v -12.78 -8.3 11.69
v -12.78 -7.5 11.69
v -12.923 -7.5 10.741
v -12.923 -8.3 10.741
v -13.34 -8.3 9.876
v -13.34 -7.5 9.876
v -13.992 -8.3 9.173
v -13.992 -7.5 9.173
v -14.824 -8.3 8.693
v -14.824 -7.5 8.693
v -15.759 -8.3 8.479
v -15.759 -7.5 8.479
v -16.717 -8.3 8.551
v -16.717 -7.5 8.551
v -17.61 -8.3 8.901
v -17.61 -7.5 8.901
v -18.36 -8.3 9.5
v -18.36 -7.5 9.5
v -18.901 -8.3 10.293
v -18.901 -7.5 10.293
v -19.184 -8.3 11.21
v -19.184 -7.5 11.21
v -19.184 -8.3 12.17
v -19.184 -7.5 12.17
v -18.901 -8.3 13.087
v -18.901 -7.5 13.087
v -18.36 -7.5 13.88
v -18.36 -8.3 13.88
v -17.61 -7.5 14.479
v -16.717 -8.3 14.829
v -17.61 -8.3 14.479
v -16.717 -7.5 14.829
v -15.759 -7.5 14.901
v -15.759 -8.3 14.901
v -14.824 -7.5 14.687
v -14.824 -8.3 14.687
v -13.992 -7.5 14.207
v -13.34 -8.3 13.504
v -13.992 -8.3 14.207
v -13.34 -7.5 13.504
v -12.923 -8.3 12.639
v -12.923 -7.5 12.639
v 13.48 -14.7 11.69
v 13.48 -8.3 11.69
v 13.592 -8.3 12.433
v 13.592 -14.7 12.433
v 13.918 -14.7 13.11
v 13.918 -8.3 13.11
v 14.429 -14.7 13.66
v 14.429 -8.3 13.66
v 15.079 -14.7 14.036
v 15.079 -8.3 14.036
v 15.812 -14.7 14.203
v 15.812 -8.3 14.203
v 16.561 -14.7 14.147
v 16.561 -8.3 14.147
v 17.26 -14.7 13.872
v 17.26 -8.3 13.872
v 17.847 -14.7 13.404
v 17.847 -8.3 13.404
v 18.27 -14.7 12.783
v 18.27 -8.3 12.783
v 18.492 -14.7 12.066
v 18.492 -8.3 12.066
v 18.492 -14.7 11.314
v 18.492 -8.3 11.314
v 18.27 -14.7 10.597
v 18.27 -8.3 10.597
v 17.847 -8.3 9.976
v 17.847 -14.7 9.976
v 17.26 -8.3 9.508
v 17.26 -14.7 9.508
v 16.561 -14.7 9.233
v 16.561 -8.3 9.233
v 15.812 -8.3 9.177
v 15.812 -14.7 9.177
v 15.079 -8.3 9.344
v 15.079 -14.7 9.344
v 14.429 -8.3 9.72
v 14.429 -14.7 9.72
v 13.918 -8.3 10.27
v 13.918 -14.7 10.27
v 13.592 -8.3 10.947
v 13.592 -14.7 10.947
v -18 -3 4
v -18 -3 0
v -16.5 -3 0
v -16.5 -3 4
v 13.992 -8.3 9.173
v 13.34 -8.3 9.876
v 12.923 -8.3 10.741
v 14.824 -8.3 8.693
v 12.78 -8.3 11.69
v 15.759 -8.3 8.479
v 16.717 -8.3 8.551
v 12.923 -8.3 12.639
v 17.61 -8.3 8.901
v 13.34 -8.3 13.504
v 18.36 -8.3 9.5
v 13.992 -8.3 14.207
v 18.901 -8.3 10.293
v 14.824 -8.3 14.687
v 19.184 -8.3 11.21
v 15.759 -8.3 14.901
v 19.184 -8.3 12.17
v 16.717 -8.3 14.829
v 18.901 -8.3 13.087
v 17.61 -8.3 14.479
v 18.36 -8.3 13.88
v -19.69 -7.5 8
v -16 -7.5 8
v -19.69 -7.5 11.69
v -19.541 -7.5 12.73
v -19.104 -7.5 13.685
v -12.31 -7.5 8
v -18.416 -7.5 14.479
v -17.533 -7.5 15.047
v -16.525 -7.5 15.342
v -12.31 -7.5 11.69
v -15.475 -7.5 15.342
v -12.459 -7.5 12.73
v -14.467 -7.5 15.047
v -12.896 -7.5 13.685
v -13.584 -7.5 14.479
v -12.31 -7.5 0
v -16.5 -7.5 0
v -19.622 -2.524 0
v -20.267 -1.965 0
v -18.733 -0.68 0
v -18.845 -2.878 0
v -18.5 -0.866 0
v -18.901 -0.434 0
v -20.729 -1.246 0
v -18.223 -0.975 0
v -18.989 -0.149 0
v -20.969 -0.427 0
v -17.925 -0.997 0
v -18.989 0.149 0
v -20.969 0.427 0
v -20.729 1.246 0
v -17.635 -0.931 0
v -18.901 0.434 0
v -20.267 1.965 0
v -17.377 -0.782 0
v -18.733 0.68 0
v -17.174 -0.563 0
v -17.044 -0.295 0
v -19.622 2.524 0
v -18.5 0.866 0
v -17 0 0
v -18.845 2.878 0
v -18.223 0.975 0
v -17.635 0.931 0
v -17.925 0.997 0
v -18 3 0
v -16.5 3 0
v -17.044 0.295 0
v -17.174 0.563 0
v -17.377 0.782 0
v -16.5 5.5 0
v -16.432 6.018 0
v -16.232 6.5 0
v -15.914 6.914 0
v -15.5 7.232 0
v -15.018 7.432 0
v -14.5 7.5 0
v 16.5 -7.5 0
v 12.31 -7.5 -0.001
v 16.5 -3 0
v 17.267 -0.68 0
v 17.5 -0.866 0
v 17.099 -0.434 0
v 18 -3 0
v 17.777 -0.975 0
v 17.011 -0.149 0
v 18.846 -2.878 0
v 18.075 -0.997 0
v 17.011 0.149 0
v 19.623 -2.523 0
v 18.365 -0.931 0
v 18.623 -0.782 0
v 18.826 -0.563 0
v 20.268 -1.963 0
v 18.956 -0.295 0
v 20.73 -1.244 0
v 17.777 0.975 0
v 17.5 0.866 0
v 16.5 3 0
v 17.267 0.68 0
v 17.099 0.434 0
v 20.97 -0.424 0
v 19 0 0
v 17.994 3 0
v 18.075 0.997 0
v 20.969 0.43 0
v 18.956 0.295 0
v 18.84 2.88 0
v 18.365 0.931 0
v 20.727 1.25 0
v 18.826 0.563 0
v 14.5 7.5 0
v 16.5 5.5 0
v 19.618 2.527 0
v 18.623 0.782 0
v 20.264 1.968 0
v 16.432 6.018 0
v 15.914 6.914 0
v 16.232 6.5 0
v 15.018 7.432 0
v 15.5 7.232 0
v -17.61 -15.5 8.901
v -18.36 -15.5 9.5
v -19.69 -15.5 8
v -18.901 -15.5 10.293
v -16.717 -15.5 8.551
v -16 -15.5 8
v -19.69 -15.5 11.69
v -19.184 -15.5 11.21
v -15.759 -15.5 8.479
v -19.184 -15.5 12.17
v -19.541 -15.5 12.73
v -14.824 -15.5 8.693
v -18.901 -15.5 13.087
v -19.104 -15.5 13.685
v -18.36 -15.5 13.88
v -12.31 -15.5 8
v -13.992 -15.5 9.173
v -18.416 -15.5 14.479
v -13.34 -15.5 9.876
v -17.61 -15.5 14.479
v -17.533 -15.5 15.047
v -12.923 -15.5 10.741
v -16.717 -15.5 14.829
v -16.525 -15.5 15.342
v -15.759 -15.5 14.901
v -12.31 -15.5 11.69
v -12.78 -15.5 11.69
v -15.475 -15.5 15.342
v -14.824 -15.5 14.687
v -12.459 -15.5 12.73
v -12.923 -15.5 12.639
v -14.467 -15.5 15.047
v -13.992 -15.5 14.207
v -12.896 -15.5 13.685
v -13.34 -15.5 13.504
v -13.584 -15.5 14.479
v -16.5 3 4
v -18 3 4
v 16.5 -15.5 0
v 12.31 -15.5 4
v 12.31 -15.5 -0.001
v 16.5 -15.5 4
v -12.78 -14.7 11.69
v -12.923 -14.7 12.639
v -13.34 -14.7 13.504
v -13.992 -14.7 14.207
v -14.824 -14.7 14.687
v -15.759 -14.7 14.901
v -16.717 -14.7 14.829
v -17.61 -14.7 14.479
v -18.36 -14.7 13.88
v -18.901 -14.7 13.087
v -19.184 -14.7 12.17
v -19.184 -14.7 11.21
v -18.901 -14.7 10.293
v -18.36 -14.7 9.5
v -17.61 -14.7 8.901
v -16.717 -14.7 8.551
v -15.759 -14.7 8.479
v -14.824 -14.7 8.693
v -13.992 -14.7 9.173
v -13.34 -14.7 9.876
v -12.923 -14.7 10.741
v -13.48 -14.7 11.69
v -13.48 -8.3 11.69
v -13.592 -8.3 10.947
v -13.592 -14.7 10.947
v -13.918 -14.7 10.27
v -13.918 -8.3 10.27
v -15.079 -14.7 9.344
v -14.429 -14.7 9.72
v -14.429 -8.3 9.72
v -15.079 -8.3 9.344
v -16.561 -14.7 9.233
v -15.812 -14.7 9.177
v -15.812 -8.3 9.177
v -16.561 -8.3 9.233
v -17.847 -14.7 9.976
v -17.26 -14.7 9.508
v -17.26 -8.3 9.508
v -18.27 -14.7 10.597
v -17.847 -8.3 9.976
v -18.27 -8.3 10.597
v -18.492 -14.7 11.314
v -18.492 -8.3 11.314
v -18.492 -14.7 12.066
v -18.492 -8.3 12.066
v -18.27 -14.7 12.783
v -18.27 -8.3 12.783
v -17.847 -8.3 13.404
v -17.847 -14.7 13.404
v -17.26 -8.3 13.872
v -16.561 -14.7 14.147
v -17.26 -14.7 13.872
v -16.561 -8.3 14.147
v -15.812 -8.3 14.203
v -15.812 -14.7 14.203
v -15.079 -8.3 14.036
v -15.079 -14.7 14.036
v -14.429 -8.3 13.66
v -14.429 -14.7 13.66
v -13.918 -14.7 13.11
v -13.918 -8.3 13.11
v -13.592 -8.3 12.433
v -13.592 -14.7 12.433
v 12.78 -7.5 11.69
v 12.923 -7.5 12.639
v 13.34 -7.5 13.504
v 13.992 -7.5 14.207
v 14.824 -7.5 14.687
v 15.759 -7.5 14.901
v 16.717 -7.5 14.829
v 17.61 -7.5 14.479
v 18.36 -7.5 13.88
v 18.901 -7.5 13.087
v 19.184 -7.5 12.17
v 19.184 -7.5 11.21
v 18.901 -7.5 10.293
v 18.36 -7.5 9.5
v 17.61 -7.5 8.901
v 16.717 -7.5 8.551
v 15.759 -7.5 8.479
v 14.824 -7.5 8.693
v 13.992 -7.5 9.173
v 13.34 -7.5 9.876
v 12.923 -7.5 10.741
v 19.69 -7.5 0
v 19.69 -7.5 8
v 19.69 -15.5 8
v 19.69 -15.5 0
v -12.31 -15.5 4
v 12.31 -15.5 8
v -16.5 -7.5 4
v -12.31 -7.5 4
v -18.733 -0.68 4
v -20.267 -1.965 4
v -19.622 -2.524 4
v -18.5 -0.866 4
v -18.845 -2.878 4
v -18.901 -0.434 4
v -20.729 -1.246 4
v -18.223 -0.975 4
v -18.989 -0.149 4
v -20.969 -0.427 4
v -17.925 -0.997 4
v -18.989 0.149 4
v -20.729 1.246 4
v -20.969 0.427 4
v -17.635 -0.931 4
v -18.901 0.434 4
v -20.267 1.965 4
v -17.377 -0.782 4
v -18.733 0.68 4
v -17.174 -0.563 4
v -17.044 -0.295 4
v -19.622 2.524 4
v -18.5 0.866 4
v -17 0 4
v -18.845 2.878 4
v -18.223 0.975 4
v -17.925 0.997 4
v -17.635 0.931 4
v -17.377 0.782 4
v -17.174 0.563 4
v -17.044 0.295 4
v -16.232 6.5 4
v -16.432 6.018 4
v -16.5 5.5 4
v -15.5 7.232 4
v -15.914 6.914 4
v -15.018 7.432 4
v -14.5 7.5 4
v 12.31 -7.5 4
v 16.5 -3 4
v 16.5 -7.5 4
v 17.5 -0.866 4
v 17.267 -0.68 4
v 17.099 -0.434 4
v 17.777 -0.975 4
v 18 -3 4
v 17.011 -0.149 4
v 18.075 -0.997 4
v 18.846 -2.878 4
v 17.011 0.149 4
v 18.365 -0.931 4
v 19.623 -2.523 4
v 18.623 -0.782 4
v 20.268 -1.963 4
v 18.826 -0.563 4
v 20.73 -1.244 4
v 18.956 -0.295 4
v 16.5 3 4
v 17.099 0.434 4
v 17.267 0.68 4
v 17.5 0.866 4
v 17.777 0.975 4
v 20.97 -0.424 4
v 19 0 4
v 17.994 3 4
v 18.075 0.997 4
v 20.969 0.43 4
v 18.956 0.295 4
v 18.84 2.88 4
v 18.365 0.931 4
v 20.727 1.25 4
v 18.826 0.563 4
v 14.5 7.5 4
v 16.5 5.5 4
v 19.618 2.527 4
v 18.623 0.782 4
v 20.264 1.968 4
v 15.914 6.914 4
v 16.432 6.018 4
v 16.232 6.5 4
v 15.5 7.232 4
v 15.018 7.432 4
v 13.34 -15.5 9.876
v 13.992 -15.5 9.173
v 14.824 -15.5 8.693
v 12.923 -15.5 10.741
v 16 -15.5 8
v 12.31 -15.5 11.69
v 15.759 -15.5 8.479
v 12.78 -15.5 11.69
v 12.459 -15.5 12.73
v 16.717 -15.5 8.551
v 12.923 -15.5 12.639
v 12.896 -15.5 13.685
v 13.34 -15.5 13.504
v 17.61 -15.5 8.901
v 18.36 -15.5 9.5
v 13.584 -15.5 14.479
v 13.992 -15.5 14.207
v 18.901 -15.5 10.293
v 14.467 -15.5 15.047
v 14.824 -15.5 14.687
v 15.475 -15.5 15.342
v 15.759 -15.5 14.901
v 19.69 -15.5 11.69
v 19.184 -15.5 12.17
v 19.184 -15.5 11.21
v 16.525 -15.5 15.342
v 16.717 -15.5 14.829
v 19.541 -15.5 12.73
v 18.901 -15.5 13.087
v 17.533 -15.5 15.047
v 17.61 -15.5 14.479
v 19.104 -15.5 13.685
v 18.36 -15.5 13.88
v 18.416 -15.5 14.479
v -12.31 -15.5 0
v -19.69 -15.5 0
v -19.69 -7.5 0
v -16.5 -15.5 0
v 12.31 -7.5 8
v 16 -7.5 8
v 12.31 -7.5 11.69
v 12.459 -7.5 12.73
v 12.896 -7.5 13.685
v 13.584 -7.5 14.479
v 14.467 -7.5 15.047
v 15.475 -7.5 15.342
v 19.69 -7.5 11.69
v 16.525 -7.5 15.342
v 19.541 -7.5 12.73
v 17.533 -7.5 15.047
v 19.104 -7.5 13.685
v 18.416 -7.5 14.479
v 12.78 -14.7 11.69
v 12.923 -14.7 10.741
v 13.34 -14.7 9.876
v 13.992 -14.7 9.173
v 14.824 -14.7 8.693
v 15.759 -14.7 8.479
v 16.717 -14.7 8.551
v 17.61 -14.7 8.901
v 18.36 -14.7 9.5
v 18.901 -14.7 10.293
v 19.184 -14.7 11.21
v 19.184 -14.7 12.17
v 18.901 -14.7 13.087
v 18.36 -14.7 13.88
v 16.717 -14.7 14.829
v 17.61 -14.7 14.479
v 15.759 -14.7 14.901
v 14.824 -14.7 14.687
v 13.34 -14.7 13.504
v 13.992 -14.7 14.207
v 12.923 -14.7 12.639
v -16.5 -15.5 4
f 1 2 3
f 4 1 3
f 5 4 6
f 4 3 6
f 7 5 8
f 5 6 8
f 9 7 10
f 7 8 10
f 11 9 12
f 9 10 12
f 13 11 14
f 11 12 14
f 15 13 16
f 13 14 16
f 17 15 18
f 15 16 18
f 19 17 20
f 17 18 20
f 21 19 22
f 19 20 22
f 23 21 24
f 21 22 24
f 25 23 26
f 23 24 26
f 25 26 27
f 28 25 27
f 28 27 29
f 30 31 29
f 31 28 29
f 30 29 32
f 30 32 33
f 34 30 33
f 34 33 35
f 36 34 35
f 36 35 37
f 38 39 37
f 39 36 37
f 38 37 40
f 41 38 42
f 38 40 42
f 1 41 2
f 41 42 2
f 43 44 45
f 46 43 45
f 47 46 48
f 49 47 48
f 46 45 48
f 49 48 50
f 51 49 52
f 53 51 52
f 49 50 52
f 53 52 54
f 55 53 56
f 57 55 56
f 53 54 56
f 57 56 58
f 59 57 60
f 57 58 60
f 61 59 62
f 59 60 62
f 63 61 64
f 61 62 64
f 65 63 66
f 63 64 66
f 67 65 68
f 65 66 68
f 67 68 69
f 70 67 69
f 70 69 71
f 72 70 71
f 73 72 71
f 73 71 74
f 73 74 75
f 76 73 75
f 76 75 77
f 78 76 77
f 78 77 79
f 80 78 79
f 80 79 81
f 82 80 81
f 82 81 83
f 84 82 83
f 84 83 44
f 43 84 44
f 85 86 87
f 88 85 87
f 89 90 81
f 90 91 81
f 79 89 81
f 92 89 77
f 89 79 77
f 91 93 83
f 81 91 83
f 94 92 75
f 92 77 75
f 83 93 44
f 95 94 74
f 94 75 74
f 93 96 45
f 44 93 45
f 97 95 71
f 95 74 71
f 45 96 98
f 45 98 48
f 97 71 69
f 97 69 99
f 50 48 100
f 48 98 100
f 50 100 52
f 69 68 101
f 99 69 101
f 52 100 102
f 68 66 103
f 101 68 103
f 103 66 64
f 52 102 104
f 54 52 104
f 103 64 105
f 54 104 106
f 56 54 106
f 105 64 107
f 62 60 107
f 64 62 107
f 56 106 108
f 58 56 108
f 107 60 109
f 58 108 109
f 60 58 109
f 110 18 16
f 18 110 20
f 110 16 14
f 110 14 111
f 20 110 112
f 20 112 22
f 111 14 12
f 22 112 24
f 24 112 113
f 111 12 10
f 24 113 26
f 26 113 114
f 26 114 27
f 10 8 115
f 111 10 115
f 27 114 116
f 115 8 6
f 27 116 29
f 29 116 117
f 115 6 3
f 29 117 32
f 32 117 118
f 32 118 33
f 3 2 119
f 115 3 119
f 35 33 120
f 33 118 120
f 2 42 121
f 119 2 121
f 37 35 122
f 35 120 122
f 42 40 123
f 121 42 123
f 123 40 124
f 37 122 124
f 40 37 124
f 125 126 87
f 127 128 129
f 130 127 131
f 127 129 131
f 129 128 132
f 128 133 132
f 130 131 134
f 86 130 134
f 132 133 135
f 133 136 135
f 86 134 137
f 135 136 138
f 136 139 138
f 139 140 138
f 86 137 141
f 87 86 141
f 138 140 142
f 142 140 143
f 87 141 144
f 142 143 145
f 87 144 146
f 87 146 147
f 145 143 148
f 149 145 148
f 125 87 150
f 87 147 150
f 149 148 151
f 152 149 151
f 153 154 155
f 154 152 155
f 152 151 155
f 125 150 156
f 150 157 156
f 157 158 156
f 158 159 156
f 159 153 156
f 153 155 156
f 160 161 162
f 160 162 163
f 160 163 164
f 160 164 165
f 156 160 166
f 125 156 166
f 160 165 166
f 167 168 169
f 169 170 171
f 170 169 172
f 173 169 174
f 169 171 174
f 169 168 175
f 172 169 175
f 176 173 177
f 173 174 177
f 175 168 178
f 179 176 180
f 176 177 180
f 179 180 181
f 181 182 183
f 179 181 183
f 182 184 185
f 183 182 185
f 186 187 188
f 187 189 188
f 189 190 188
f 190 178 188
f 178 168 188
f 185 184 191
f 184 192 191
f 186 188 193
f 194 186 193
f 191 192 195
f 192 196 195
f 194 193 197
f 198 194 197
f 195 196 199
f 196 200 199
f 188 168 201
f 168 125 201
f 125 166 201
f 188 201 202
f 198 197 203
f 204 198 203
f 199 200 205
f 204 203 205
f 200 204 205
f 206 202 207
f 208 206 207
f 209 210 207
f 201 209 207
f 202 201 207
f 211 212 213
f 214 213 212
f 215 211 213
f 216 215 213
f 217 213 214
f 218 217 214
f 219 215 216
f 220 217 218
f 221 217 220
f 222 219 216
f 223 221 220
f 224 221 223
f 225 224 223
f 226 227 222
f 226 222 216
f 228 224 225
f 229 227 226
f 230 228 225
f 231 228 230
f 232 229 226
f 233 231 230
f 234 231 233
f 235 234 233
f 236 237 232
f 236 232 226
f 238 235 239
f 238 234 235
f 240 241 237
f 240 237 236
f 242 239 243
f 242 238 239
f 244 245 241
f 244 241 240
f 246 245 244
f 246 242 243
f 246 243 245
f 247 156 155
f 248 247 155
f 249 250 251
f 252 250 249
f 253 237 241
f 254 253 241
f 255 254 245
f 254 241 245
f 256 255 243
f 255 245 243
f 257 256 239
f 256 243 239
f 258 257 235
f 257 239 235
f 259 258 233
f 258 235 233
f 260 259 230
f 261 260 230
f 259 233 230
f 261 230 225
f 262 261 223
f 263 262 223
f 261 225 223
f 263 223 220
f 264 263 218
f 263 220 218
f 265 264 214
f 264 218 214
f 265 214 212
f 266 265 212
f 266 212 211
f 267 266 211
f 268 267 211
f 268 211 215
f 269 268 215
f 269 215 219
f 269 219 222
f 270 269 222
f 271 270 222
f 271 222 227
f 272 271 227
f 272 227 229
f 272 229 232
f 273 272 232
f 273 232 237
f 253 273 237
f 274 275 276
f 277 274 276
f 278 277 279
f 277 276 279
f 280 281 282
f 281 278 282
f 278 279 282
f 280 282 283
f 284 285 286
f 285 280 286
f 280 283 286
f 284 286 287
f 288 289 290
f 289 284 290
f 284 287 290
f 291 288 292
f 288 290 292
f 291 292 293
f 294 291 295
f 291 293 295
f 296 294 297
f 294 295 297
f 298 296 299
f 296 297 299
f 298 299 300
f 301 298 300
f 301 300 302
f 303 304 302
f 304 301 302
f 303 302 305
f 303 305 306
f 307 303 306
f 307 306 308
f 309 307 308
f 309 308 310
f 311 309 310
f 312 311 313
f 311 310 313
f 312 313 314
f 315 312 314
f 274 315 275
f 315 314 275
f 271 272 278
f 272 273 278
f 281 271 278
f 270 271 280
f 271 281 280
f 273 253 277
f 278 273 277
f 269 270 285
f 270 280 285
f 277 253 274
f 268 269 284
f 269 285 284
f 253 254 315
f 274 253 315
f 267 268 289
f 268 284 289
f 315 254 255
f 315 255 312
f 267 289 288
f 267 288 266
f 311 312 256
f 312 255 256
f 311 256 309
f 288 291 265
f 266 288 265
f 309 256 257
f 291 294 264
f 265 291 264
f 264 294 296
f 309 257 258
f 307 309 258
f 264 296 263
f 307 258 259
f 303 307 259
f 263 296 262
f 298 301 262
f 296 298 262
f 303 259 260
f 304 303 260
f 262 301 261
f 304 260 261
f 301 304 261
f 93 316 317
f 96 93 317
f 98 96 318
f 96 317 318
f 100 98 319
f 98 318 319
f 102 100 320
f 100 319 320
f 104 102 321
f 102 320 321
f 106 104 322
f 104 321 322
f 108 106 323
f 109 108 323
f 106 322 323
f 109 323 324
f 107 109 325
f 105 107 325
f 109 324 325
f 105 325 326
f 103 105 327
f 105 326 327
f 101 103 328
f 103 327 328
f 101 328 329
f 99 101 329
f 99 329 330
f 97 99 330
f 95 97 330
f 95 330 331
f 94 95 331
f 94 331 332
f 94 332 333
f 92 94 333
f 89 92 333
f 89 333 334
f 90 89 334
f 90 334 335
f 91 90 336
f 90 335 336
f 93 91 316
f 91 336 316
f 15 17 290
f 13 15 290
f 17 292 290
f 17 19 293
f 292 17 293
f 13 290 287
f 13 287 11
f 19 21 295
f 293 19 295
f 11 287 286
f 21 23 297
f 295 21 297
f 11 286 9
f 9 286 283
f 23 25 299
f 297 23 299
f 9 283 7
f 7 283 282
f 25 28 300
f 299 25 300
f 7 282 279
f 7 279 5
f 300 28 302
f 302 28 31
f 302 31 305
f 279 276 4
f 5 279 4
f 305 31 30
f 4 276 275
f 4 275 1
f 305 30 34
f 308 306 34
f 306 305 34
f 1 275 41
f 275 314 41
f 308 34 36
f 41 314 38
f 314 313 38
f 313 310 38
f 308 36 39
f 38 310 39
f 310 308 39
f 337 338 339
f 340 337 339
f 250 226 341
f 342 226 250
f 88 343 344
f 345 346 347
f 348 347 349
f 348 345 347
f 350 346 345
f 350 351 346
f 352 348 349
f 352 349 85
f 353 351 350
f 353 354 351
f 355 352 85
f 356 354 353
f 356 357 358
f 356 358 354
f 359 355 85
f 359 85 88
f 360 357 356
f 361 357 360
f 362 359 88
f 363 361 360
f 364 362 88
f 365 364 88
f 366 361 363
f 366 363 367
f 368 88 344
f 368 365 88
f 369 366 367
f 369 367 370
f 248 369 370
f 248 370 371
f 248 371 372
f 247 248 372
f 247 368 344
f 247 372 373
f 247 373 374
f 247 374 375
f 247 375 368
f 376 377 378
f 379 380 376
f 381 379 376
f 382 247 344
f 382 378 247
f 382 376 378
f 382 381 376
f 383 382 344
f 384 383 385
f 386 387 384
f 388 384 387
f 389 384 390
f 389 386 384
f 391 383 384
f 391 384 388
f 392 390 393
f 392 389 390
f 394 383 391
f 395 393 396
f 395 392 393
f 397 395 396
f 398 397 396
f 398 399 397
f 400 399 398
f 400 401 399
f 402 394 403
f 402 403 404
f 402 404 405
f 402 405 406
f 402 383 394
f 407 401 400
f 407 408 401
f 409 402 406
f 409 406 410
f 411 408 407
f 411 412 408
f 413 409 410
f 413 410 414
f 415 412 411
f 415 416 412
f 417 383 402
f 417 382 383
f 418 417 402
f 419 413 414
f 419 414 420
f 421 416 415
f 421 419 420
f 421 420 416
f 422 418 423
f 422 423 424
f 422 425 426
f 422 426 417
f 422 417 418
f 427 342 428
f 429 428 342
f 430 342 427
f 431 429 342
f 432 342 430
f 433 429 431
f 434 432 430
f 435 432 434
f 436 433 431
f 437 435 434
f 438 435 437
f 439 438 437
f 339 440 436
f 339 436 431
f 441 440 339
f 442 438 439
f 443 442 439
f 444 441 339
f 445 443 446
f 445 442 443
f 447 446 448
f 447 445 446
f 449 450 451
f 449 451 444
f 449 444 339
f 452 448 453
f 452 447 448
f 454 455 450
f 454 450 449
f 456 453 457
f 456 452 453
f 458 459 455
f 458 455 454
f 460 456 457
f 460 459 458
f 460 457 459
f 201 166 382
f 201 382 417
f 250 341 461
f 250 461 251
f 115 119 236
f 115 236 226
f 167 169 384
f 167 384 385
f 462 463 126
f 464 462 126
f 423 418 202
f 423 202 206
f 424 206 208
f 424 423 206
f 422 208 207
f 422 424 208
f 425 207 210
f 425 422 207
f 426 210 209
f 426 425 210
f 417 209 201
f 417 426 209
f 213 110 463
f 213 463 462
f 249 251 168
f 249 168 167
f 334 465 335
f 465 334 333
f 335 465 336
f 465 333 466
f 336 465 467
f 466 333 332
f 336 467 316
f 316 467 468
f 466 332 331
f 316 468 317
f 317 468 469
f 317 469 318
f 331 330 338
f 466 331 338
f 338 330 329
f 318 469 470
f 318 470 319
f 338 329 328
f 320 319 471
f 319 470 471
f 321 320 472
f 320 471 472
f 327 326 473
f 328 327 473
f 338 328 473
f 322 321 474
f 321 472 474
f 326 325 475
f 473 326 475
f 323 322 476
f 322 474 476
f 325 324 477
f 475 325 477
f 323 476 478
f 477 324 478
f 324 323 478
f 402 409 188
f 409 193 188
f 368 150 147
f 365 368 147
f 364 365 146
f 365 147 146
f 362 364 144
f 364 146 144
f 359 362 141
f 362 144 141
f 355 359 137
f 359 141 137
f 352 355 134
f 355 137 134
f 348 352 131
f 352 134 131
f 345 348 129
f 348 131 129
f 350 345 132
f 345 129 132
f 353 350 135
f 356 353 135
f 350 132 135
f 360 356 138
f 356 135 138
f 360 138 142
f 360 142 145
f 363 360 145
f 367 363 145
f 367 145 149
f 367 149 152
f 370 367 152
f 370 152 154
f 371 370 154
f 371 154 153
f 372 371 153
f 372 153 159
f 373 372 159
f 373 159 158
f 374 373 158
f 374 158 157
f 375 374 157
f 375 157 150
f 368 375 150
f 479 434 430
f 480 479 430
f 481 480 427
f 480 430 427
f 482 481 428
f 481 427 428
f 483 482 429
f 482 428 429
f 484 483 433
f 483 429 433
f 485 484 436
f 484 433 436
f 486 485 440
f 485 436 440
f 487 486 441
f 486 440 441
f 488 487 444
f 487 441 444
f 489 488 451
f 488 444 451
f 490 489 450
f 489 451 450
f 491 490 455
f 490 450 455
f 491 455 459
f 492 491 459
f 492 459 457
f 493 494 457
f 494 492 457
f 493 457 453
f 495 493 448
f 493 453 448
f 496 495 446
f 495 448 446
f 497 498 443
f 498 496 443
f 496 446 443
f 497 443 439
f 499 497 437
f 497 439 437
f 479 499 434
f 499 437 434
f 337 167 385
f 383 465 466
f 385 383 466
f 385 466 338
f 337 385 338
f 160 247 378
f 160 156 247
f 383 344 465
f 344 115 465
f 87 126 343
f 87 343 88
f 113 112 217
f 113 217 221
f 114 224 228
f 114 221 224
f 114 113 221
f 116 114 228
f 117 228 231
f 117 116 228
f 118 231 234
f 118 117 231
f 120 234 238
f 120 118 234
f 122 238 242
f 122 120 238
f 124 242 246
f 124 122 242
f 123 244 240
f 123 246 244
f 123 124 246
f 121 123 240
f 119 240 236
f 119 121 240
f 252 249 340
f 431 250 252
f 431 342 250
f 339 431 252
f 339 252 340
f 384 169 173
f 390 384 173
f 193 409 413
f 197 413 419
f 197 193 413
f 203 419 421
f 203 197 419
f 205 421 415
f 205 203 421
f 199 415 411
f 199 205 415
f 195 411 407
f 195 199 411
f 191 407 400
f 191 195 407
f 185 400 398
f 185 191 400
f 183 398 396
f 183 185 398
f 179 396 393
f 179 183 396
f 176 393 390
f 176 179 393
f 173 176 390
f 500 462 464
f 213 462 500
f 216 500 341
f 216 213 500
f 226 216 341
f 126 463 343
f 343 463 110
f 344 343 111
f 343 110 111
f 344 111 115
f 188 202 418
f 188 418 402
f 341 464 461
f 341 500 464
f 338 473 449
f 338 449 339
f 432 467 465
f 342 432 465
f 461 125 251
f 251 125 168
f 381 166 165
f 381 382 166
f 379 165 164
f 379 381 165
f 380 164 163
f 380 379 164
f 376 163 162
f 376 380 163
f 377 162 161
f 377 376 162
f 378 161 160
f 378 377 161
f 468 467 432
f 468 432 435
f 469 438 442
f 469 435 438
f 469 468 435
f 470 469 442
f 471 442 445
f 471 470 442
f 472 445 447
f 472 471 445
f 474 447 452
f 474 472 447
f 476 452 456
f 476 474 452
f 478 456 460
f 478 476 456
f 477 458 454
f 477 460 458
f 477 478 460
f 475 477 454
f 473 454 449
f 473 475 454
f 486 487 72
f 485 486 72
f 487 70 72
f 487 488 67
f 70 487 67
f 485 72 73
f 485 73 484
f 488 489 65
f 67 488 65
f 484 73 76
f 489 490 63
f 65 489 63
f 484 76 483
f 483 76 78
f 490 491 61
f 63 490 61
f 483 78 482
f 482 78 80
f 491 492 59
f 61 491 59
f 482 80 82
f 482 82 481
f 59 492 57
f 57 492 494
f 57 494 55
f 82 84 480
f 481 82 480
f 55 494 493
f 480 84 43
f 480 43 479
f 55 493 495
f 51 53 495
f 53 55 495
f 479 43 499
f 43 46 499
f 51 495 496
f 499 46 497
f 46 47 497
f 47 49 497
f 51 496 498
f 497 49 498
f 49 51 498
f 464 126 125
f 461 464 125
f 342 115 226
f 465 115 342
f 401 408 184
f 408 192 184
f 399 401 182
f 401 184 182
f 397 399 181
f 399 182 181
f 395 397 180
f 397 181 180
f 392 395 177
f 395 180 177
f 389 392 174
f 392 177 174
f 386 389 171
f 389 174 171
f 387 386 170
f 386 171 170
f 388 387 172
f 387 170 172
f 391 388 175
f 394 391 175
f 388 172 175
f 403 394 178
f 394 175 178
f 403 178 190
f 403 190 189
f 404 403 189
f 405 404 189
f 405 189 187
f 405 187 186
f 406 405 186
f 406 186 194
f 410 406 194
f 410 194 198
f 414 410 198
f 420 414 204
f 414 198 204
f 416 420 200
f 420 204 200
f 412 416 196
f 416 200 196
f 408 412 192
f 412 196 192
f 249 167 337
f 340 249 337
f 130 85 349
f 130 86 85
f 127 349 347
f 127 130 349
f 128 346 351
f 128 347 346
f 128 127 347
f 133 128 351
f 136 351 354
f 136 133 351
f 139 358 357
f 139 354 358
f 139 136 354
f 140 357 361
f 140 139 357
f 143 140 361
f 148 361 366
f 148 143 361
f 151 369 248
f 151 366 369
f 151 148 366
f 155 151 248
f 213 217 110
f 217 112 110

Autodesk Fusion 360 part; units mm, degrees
sketch "Sketch1" plane through (0, 0, 0) normal (0, 0, 1) x (1, 0, 0) in component "Component"
  line L0 (16.5, -7.5) -> (-16.5, -7.5)
  line L1 (-16.5, -7.5) -> (-16.5, 7.5)
  line L2 (-16.5, 7.5) -> (16.5, 7.5)
  line L3 (16.5, 7.5) -> (16.5, -7.5)
  line L4 (16.5, -7.5) -> (-16.5, 7.5) construction
  line L5 (-16.5, -7.5) -> (16.5, 7.5) construction
  line L6 (-18, 0) -> (18, 0) construction
  circle A0 centre (-18, 0) radius 1
  circle A1 centre (-18, 0) radius 1.5 construction
  circle A2 centre (18, 0) radius 1
  circle A3 centre (18, 0) radius 1.5 construction
  line L7 (-18, -3) -> (18, -3)
  arc A4 (18, -3) -> (17.9937, 3) centre (18, 0) ccw
  line L8 (17.9937, 3) -> (-18, 3)
  arc A5 (-18, 3) -> (-18, -3) centre (-18, 0) ccw
  line L9 (-18, 0) -> (18, 0) construction
  line L10 (21, 0.0031) -> (-21, 0)
  dimension "d1" = 33
  dimension "d2" = 15
  dimension "d3" = 36
  dimension "d4" = 2
  dimension "d6" = 7.5
  dimension "d7" = 2
  dimension "d31" = 42
extrude "Extrude1" add sketch "Sketch1" along normal blind 4 contours L0 L1 L3 L7 | L1 L3 L7 L10 | L3 A2 L7 A4 L10 | L1 A0 L7 A5 L10 | L1 L3 L8 L10 | L3 A2 A4 L8 L10 | L1 A0 L8 A5 L10 | L1 L2 L3 L8 in component "Component"
sketch "Sketch4" plane through (0, -7.5, 0) normal (0, -1, 0) x (1, 0, 0) in component "Component"
  line L0 (-16.5, 0) -> (16.5, 0)
  line L1 (16.5, 0) -> (16.5, 4)
  line L2 (16.5, 4) -> (-16.5, 4)
  line L3 (-16.5, 4) -> (-16.5, 0)
  circle A0 centre (-16, 11.69) radius 2.52
  circle A1 centre (-16, 11.69) radius 3.22
  line L4 (-16, 8) -> (16, 8)
  arc A2 (16, 8) -> (16, 15.38) centre (16, 11.69) ccw construction
  line L5 (16, 15.38) -> (-16, 15.38) construction
  arc A3 (-16, 15.38) -> (-16, 8) centre (-16, 11.69) ccw construction
  line L6 (-16, 11.69) -> (16, 11.69) construction
  line L7 (-21, 0) -> (21, 0)
  line L8 (21, 0) -> (21, 8)
  line L9 (21, 8) -> (-21, 8)
  line L10 (-21, 8) -> (-21, 0)
  line L11 (-19.69, 11.69) -> (-19.69, 0)
  line L12 (19.69, 11.69) -> (19.69, 0)
  circle A4 centre (-16, 11.69) radius 3.69 construction
  line L13 (-12.31, 11.69) -> (-12.31, -0.0046)
  circle A5 centre (16, 11.69) radius 3.69 construction
  line L14 (12.31, 11.69) -> (12.31, -0.001)
  arc A6 (19.69, 11.69) -> (12.31, 11.69) centre (16, 11.69) ccw
  arc A7 (-12.31, 11.69) -> (-19.69, 11.69) centre (-16, 11.69) ccw
  dimension "d23" = 5.04
  dimension "d24" = 6.44
  dimension "d27" = 7.38
  dimension "d29" = 42
  dimension "d30" = 8
  dimension "d32" = 32
  dimension "d33" = 7.38
  dimension "d34" = 7.38
extrude "Extrude2" add sketch "Sketch4" along normal blind 8 contours L0 L1 L2 L7 L14 | L0 L2 L7 L13 L14 | L1 L2 L4 L7 L9 L12 L14 | L0 L2 L3 L7 L13 | L2 L4 L9 L13 L14 | L7 L8 L9 L12 | L2 L3 L4 L7 L9 L11 L13 | L4 L9 L12 L14 A6 | L7 L9 L10 L11 | L4 L9 L11 L13 A7 | A0 | A1 in component "Component"
extrude "Extrude3" cut sketch "Sketch4" along normal blind 8 contours A0 in component "Component"
extrude "Extrude4" cut sketch "Sketch4" along normal blind 0.8 contours A1 in component "Component"
ref_plane "WorkPlane1" through (-16, -11.5, 11.69) normal (0, -1, 0) x (1, 0, 0) in component "Component"
mirror "Mirror1" about plane through (-16, -11.5, 11.69) normal (0, -1, 0) of "Extrude4" in component "Component"
ref_plane "WorkPlane2" through (0, -11.5, 4) normal (1, 0, 0) x (0, 0, 1) in component "Component"
mirror "Mirror2" about plane through (0, -11.5, 4) normal (1, 0, 0) of "Extrude3", "Extrude4", "Mirror1" in component "Component"
extrude "Extrude5" cut 2 faces at (20.1267, -12.8333, 8) (-20.1267, -10.1667, 8) along direction (0, 0, -1) blind 8 in component "Component"
fillet "Fillet1" radius 2 2 edges at (-16.5, 7.5, 2) (16.5, 7.5, 2) in component "Component"
component "Component" placed x (1, 0, 0) y (0, 1, 0) z (0, 0, 1) at (0, 0, 0)
equation "d23 = 4.8 mm + 0.24 mm"
equation "d24 = 6.2 mm + 0.24 mm"
